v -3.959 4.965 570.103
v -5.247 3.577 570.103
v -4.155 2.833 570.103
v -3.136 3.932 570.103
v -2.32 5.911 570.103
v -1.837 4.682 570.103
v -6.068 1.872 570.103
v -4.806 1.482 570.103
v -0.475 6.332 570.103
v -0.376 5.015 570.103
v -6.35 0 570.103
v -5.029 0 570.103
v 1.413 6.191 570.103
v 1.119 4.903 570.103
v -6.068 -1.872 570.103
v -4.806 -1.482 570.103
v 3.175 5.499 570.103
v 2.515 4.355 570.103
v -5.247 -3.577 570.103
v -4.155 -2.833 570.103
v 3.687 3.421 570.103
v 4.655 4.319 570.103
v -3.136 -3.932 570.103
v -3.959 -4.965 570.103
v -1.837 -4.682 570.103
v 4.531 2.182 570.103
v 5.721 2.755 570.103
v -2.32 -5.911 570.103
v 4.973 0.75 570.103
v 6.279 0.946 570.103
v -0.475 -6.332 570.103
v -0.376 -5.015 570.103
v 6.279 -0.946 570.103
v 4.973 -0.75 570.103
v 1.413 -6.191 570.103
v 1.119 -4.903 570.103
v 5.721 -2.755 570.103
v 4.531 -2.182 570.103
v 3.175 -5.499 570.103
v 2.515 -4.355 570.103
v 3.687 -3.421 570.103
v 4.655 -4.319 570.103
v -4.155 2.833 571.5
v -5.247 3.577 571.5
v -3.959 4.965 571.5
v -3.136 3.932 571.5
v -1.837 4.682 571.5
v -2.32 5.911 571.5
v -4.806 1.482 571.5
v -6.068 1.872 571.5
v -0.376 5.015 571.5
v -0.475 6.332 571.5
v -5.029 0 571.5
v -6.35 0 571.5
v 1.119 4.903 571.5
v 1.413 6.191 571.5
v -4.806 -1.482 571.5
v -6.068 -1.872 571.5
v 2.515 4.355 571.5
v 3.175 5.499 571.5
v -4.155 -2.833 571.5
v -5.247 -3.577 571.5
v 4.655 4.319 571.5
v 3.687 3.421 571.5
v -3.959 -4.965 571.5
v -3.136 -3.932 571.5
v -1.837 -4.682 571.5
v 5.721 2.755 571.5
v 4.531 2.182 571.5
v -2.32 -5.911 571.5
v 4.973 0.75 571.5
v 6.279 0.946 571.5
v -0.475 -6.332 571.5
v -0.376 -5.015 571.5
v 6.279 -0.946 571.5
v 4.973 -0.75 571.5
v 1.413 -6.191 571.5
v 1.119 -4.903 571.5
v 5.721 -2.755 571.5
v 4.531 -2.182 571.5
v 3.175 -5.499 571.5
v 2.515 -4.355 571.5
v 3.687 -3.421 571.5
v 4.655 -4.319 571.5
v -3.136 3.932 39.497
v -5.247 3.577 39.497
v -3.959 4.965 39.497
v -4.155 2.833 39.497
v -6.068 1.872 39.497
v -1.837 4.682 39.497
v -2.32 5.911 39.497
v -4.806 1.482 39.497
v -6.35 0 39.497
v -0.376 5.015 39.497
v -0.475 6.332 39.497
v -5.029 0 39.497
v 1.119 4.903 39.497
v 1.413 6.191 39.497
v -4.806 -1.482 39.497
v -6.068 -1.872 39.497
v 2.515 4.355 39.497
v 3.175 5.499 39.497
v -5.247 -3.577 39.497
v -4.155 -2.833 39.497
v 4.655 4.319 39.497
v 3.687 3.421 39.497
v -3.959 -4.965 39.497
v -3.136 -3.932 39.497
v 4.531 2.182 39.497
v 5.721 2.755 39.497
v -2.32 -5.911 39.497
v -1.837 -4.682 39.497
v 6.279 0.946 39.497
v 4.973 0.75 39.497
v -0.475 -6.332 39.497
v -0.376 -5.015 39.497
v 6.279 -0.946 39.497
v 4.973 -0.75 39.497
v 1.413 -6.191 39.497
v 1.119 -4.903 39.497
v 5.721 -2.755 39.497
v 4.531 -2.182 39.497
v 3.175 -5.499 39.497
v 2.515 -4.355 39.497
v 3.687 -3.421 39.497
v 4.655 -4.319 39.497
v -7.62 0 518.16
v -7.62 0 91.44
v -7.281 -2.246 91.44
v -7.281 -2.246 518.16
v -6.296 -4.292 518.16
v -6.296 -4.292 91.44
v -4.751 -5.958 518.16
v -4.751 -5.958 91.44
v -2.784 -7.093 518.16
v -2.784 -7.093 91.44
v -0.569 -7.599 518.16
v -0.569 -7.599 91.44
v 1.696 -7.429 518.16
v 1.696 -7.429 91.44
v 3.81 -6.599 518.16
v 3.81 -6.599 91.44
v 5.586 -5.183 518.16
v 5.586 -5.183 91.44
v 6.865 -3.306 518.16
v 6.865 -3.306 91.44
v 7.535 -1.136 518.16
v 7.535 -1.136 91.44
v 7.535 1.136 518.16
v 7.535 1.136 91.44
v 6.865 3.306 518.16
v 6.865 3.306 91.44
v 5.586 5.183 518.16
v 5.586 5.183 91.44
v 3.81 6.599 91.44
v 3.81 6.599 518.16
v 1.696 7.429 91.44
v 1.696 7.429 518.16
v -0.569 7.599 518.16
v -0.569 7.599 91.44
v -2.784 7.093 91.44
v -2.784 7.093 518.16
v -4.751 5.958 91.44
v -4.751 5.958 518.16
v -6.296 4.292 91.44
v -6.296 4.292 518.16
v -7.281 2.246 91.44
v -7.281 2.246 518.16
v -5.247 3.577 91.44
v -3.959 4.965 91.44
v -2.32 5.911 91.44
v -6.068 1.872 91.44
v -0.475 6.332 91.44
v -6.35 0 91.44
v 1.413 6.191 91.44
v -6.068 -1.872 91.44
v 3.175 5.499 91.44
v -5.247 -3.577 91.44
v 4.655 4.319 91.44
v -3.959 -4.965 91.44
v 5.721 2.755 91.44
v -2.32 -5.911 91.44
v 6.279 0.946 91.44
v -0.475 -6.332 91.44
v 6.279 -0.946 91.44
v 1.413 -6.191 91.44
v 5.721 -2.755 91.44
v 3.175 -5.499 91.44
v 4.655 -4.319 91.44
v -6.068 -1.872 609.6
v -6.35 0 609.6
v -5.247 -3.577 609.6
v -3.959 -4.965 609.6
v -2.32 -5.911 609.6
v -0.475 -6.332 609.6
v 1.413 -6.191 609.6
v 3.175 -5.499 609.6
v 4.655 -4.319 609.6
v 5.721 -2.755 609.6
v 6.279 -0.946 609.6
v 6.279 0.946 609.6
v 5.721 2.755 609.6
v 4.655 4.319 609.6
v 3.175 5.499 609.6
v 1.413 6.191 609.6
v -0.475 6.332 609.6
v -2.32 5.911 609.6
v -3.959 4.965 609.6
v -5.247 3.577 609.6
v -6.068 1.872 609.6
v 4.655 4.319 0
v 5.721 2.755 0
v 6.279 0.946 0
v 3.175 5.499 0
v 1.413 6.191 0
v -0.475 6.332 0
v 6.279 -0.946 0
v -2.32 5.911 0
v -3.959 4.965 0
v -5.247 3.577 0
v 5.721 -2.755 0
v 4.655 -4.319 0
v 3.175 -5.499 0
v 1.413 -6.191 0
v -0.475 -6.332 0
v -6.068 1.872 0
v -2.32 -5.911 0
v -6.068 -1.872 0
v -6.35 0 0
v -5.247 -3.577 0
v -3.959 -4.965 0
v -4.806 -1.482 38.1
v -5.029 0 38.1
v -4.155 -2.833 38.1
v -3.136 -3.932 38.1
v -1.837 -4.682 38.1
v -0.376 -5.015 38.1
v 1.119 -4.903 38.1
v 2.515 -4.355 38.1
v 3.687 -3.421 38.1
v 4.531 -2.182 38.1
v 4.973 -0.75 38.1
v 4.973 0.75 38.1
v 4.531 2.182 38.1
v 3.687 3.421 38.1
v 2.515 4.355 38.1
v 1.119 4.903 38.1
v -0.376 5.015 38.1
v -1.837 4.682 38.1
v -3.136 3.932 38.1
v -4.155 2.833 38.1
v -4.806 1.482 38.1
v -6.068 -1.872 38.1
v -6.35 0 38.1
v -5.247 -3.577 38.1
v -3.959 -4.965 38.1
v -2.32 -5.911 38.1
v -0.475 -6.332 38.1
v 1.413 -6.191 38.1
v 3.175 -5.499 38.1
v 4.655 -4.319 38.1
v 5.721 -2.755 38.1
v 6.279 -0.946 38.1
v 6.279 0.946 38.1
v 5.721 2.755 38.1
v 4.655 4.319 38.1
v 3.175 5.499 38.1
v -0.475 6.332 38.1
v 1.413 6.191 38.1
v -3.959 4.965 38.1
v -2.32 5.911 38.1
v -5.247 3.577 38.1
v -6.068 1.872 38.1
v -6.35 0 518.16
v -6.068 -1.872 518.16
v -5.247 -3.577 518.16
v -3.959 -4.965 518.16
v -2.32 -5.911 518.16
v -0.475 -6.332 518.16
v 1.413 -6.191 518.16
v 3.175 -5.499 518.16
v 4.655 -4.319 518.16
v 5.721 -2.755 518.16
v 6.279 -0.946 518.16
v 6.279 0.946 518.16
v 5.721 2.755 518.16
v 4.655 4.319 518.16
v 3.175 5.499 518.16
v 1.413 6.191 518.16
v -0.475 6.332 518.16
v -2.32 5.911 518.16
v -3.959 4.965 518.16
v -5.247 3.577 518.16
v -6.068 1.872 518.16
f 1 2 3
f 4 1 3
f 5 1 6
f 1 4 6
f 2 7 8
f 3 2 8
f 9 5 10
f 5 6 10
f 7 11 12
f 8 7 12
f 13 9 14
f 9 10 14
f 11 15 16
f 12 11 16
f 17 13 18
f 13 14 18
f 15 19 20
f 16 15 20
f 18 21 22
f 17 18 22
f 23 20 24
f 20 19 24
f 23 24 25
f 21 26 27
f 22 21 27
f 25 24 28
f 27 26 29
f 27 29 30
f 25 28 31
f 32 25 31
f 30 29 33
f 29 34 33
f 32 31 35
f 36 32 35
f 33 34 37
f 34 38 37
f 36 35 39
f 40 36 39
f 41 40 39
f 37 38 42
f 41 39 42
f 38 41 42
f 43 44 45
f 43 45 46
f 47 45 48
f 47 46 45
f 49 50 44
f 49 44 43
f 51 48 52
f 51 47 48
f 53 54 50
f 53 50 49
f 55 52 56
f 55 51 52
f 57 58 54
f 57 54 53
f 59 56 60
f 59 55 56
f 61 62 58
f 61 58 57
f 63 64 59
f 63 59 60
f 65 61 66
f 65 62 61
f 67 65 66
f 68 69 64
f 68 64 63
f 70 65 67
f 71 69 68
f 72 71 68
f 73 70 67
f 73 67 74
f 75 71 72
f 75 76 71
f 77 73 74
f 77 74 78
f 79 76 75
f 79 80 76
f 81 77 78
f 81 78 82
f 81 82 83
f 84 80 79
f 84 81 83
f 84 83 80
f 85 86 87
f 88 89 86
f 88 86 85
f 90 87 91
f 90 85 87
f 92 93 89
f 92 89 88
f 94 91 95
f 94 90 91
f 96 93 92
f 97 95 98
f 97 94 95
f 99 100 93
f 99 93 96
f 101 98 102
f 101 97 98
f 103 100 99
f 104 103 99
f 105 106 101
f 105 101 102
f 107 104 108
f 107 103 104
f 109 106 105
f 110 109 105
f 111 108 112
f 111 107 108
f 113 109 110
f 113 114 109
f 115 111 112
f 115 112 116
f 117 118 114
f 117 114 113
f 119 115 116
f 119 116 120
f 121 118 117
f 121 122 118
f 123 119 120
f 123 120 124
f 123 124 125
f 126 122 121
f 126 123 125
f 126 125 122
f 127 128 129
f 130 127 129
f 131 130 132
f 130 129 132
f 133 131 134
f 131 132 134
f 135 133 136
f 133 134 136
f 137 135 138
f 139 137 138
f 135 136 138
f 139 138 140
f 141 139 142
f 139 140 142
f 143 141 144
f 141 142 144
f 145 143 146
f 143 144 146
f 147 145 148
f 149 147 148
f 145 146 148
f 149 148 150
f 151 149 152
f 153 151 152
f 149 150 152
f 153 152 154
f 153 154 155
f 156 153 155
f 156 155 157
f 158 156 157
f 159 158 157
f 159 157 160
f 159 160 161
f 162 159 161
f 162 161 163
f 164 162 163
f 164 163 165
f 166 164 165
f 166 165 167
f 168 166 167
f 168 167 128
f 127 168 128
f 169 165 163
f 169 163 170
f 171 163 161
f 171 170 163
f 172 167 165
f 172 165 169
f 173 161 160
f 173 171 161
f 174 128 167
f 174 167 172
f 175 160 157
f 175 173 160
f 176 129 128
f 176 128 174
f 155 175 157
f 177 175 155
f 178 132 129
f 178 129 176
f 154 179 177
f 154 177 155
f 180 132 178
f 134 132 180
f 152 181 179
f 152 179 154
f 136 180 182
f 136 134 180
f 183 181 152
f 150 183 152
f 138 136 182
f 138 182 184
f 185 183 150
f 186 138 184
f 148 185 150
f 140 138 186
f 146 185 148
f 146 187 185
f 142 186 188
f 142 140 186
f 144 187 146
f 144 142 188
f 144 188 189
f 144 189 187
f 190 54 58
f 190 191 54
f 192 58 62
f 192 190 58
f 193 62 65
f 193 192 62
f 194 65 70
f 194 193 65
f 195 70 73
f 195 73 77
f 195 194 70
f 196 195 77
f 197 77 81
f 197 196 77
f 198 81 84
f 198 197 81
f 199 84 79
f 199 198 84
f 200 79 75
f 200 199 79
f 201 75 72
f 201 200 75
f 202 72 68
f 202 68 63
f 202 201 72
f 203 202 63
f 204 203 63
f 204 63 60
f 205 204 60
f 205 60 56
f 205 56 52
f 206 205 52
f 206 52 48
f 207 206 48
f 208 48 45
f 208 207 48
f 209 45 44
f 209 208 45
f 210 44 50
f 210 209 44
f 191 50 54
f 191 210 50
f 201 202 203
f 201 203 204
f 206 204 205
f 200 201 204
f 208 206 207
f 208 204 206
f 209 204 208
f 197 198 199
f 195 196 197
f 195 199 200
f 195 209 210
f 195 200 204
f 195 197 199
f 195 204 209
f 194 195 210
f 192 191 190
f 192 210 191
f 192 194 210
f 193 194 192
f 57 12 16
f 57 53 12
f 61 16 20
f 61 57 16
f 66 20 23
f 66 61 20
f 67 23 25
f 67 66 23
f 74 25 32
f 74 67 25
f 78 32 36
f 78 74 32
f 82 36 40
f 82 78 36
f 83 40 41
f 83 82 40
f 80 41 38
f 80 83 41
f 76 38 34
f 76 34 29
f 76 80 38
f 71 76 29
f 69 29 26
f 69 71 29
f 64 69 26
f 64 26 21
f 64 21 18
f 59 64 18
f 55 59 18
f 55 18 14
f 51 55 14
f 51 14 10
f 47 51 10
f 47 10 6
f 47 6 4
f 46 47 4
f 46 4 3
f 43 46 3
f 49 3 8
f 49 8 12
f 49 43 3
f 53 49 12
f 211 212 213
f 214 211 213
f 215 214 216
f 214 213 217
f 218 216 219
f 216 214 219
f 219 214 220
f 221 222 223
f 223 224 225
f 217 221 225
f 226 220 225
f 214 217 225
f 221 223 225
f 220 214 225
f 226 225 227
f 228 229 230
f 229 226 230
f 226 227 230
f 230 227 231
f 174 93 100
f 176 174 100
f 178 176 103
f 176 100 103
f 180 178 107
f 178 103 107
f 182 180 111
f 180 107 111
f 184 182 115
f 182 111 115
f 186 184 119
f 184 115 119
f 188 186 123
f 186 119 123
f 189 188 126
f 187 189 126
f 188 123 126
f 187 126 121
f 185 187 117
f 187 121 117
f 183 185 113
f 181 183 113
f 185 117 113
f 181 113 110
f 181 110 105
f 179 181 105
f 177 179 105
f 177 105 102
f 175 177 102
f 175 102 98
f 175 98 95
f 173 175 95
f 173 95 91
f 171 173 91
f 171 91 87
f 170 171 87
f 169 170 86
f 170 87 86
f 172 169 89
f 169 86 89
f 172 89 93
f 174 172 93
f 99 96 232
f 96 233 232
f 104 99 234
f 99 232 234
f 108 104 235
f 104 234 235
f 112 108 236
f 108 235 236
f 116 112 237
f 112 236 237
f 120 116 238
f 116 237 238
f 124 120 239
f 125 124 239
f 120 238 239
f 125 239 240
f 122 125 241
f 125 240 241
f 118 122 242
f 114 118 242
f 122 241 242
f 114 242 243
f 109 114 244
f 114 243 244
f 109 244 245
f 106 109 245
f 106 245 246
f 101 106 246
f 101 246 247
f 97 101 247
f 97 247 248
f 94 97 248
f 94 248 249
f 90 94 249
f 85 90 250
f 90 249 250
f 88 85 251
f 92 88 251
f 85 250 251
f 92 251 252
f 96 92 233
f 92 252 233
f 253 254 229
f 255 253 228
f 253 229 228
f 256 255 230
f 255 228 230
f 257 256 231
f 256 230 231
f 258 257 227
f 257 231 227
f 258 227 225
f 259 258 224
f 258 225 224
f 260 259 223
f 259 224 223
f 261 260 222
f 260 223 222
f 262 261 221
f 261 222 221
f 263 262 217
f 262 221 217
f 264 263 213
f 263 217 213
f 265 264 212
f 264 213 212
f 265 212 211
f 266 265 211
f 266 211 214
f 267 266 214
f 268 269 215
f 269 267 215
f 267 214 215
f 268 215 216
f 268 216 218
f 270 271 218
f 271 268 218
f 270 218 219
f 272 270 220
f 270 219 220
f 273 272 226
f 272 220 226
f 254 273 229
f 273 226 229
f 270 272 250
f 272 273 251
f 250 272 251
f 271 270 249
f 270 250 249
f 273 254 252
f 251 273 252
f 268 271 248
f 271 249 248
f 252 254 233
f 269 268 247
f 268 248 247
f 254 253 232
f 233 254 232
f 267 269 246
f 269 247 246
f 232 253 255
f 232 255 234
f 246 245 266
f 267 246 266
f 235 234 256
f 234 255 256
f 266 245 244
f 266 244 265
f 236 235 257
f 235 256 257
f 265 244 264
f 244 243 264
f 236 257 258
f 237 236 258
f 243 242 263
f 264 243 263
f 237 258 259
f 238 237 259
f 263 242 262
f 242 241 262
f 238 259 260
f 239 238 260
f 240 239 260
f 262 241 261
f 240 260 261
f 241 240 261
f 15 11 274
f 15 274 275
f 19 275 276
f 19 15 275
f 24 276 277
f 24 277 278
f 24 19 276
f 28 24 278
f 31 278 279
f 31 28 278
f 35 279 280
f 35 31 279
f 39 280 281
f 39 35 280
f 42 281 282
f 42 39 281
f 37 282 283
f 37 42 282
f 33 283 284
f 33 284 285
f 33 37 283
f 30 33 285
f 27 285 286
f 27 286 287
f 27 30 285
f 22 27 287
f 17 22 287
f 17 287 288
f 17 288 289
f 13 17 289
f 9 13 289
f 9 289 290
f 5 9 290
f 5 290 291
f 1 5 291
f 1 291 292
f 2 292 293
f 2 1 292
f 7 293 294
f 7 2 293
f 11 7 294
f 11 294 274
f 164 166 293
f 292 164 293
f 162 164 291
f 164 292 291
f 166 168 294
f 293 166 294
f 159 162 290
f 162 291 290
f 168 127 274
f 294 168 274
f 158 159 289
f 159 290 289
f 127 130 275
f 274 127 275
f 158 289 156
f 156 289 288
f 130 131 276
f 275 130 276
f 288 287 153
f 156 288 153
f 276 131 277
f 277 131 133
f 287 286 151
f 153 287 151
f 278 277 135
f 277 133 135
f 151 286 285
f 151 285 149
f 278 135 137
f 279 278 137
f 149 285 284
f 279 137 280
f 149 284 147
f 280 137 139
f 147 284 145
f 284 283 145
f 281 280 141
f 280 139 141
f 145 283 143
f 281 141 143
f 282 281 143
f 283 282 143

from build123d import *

# Parameters (mm, degrees)
SKETCH1_R           = 7.62
BOSS_EXTRUDE1_DEPTH = 609.6
FILLET1_R           = 0.25
SKETCH2_W           = 1.27
SKETCH2_H           = 91.44
SKETCH4_W           = 2.6416
SKETCH4_H           = 1.397


with BuildPart() as part:
    # Sketch1 → Boss-Extrude1 (new body)
    with BuildSketch(Plane.XY):
        with Locations(Location((0, 0, 0), (0, 0, 180))):
            Circle(SKETCH1_R)
    extrude(amount=BOSS_EXTRUDE1_DEPTH)

    # Fillet1
    fillet1_edges = [part.edges().sort_by_distance(p)[0] for p in [
        (7.62, 0, 0),
        (7.62, 0, 609.6),
    ]]
    fillet(fillet1_edges, radius=FILLET1_R)

    # Sketch2 → Cut-Revolve2 (revolve, cut)
    with BuildSketch(Plane(origin=(0, 0, 0), x_dir=(1, 0, 0), z_dir=(0, 1, 0)), mode=Mode.PRIVATE) as cut_revolve2_sk:
        with Locations((6.985, -45.72)):
            Rectangle(SKETCH2_W, SKETCH2_H)
    cut_revolve2 = revolve(cut_revolve2_sk.sketch.rotate(Axis((0, 0, 0.780201326), (0, 0, 1)), 180), axis=Axis((0, 0, 0.780201326), (0, 0, 1)), mode=Mode.SUBTRACT)

    # Sketch4 → Cut-Revolve3 (revolve, cut)
    with BuildSketch(Plane(origin=(0, 0, 0), x_dir=(1, 0, 0), z_dir=(0, 1, 0)), mode=Mode.PRIVATE) as cut_revolve3_sk:
        with Locations((6.35, -38.7985)):
            Rectangle(SKETCH4_W, SKETCH4_H)
    cut_revolve3 = revolve(cut_revolve3_sk.sketch.rotate(Axis((0, 0, 0), (0, 0, 1)), 180), axis=Axis((0, 0, 0), (0, 0, 1)), mode=Mode.SUBTRACT)

    # Mirror1: Cut-Revolve2, Cut-Revolve3 across plane
    add(cut_revolve2.mirror(Plane.XY.offset(304.8)), mode=Mode.SUBTRACT)
    add(cut_revolve3.mirror(Plane.XY.offset(304.8)), mode=Mode.SUBTRACT)


solid = part.part
